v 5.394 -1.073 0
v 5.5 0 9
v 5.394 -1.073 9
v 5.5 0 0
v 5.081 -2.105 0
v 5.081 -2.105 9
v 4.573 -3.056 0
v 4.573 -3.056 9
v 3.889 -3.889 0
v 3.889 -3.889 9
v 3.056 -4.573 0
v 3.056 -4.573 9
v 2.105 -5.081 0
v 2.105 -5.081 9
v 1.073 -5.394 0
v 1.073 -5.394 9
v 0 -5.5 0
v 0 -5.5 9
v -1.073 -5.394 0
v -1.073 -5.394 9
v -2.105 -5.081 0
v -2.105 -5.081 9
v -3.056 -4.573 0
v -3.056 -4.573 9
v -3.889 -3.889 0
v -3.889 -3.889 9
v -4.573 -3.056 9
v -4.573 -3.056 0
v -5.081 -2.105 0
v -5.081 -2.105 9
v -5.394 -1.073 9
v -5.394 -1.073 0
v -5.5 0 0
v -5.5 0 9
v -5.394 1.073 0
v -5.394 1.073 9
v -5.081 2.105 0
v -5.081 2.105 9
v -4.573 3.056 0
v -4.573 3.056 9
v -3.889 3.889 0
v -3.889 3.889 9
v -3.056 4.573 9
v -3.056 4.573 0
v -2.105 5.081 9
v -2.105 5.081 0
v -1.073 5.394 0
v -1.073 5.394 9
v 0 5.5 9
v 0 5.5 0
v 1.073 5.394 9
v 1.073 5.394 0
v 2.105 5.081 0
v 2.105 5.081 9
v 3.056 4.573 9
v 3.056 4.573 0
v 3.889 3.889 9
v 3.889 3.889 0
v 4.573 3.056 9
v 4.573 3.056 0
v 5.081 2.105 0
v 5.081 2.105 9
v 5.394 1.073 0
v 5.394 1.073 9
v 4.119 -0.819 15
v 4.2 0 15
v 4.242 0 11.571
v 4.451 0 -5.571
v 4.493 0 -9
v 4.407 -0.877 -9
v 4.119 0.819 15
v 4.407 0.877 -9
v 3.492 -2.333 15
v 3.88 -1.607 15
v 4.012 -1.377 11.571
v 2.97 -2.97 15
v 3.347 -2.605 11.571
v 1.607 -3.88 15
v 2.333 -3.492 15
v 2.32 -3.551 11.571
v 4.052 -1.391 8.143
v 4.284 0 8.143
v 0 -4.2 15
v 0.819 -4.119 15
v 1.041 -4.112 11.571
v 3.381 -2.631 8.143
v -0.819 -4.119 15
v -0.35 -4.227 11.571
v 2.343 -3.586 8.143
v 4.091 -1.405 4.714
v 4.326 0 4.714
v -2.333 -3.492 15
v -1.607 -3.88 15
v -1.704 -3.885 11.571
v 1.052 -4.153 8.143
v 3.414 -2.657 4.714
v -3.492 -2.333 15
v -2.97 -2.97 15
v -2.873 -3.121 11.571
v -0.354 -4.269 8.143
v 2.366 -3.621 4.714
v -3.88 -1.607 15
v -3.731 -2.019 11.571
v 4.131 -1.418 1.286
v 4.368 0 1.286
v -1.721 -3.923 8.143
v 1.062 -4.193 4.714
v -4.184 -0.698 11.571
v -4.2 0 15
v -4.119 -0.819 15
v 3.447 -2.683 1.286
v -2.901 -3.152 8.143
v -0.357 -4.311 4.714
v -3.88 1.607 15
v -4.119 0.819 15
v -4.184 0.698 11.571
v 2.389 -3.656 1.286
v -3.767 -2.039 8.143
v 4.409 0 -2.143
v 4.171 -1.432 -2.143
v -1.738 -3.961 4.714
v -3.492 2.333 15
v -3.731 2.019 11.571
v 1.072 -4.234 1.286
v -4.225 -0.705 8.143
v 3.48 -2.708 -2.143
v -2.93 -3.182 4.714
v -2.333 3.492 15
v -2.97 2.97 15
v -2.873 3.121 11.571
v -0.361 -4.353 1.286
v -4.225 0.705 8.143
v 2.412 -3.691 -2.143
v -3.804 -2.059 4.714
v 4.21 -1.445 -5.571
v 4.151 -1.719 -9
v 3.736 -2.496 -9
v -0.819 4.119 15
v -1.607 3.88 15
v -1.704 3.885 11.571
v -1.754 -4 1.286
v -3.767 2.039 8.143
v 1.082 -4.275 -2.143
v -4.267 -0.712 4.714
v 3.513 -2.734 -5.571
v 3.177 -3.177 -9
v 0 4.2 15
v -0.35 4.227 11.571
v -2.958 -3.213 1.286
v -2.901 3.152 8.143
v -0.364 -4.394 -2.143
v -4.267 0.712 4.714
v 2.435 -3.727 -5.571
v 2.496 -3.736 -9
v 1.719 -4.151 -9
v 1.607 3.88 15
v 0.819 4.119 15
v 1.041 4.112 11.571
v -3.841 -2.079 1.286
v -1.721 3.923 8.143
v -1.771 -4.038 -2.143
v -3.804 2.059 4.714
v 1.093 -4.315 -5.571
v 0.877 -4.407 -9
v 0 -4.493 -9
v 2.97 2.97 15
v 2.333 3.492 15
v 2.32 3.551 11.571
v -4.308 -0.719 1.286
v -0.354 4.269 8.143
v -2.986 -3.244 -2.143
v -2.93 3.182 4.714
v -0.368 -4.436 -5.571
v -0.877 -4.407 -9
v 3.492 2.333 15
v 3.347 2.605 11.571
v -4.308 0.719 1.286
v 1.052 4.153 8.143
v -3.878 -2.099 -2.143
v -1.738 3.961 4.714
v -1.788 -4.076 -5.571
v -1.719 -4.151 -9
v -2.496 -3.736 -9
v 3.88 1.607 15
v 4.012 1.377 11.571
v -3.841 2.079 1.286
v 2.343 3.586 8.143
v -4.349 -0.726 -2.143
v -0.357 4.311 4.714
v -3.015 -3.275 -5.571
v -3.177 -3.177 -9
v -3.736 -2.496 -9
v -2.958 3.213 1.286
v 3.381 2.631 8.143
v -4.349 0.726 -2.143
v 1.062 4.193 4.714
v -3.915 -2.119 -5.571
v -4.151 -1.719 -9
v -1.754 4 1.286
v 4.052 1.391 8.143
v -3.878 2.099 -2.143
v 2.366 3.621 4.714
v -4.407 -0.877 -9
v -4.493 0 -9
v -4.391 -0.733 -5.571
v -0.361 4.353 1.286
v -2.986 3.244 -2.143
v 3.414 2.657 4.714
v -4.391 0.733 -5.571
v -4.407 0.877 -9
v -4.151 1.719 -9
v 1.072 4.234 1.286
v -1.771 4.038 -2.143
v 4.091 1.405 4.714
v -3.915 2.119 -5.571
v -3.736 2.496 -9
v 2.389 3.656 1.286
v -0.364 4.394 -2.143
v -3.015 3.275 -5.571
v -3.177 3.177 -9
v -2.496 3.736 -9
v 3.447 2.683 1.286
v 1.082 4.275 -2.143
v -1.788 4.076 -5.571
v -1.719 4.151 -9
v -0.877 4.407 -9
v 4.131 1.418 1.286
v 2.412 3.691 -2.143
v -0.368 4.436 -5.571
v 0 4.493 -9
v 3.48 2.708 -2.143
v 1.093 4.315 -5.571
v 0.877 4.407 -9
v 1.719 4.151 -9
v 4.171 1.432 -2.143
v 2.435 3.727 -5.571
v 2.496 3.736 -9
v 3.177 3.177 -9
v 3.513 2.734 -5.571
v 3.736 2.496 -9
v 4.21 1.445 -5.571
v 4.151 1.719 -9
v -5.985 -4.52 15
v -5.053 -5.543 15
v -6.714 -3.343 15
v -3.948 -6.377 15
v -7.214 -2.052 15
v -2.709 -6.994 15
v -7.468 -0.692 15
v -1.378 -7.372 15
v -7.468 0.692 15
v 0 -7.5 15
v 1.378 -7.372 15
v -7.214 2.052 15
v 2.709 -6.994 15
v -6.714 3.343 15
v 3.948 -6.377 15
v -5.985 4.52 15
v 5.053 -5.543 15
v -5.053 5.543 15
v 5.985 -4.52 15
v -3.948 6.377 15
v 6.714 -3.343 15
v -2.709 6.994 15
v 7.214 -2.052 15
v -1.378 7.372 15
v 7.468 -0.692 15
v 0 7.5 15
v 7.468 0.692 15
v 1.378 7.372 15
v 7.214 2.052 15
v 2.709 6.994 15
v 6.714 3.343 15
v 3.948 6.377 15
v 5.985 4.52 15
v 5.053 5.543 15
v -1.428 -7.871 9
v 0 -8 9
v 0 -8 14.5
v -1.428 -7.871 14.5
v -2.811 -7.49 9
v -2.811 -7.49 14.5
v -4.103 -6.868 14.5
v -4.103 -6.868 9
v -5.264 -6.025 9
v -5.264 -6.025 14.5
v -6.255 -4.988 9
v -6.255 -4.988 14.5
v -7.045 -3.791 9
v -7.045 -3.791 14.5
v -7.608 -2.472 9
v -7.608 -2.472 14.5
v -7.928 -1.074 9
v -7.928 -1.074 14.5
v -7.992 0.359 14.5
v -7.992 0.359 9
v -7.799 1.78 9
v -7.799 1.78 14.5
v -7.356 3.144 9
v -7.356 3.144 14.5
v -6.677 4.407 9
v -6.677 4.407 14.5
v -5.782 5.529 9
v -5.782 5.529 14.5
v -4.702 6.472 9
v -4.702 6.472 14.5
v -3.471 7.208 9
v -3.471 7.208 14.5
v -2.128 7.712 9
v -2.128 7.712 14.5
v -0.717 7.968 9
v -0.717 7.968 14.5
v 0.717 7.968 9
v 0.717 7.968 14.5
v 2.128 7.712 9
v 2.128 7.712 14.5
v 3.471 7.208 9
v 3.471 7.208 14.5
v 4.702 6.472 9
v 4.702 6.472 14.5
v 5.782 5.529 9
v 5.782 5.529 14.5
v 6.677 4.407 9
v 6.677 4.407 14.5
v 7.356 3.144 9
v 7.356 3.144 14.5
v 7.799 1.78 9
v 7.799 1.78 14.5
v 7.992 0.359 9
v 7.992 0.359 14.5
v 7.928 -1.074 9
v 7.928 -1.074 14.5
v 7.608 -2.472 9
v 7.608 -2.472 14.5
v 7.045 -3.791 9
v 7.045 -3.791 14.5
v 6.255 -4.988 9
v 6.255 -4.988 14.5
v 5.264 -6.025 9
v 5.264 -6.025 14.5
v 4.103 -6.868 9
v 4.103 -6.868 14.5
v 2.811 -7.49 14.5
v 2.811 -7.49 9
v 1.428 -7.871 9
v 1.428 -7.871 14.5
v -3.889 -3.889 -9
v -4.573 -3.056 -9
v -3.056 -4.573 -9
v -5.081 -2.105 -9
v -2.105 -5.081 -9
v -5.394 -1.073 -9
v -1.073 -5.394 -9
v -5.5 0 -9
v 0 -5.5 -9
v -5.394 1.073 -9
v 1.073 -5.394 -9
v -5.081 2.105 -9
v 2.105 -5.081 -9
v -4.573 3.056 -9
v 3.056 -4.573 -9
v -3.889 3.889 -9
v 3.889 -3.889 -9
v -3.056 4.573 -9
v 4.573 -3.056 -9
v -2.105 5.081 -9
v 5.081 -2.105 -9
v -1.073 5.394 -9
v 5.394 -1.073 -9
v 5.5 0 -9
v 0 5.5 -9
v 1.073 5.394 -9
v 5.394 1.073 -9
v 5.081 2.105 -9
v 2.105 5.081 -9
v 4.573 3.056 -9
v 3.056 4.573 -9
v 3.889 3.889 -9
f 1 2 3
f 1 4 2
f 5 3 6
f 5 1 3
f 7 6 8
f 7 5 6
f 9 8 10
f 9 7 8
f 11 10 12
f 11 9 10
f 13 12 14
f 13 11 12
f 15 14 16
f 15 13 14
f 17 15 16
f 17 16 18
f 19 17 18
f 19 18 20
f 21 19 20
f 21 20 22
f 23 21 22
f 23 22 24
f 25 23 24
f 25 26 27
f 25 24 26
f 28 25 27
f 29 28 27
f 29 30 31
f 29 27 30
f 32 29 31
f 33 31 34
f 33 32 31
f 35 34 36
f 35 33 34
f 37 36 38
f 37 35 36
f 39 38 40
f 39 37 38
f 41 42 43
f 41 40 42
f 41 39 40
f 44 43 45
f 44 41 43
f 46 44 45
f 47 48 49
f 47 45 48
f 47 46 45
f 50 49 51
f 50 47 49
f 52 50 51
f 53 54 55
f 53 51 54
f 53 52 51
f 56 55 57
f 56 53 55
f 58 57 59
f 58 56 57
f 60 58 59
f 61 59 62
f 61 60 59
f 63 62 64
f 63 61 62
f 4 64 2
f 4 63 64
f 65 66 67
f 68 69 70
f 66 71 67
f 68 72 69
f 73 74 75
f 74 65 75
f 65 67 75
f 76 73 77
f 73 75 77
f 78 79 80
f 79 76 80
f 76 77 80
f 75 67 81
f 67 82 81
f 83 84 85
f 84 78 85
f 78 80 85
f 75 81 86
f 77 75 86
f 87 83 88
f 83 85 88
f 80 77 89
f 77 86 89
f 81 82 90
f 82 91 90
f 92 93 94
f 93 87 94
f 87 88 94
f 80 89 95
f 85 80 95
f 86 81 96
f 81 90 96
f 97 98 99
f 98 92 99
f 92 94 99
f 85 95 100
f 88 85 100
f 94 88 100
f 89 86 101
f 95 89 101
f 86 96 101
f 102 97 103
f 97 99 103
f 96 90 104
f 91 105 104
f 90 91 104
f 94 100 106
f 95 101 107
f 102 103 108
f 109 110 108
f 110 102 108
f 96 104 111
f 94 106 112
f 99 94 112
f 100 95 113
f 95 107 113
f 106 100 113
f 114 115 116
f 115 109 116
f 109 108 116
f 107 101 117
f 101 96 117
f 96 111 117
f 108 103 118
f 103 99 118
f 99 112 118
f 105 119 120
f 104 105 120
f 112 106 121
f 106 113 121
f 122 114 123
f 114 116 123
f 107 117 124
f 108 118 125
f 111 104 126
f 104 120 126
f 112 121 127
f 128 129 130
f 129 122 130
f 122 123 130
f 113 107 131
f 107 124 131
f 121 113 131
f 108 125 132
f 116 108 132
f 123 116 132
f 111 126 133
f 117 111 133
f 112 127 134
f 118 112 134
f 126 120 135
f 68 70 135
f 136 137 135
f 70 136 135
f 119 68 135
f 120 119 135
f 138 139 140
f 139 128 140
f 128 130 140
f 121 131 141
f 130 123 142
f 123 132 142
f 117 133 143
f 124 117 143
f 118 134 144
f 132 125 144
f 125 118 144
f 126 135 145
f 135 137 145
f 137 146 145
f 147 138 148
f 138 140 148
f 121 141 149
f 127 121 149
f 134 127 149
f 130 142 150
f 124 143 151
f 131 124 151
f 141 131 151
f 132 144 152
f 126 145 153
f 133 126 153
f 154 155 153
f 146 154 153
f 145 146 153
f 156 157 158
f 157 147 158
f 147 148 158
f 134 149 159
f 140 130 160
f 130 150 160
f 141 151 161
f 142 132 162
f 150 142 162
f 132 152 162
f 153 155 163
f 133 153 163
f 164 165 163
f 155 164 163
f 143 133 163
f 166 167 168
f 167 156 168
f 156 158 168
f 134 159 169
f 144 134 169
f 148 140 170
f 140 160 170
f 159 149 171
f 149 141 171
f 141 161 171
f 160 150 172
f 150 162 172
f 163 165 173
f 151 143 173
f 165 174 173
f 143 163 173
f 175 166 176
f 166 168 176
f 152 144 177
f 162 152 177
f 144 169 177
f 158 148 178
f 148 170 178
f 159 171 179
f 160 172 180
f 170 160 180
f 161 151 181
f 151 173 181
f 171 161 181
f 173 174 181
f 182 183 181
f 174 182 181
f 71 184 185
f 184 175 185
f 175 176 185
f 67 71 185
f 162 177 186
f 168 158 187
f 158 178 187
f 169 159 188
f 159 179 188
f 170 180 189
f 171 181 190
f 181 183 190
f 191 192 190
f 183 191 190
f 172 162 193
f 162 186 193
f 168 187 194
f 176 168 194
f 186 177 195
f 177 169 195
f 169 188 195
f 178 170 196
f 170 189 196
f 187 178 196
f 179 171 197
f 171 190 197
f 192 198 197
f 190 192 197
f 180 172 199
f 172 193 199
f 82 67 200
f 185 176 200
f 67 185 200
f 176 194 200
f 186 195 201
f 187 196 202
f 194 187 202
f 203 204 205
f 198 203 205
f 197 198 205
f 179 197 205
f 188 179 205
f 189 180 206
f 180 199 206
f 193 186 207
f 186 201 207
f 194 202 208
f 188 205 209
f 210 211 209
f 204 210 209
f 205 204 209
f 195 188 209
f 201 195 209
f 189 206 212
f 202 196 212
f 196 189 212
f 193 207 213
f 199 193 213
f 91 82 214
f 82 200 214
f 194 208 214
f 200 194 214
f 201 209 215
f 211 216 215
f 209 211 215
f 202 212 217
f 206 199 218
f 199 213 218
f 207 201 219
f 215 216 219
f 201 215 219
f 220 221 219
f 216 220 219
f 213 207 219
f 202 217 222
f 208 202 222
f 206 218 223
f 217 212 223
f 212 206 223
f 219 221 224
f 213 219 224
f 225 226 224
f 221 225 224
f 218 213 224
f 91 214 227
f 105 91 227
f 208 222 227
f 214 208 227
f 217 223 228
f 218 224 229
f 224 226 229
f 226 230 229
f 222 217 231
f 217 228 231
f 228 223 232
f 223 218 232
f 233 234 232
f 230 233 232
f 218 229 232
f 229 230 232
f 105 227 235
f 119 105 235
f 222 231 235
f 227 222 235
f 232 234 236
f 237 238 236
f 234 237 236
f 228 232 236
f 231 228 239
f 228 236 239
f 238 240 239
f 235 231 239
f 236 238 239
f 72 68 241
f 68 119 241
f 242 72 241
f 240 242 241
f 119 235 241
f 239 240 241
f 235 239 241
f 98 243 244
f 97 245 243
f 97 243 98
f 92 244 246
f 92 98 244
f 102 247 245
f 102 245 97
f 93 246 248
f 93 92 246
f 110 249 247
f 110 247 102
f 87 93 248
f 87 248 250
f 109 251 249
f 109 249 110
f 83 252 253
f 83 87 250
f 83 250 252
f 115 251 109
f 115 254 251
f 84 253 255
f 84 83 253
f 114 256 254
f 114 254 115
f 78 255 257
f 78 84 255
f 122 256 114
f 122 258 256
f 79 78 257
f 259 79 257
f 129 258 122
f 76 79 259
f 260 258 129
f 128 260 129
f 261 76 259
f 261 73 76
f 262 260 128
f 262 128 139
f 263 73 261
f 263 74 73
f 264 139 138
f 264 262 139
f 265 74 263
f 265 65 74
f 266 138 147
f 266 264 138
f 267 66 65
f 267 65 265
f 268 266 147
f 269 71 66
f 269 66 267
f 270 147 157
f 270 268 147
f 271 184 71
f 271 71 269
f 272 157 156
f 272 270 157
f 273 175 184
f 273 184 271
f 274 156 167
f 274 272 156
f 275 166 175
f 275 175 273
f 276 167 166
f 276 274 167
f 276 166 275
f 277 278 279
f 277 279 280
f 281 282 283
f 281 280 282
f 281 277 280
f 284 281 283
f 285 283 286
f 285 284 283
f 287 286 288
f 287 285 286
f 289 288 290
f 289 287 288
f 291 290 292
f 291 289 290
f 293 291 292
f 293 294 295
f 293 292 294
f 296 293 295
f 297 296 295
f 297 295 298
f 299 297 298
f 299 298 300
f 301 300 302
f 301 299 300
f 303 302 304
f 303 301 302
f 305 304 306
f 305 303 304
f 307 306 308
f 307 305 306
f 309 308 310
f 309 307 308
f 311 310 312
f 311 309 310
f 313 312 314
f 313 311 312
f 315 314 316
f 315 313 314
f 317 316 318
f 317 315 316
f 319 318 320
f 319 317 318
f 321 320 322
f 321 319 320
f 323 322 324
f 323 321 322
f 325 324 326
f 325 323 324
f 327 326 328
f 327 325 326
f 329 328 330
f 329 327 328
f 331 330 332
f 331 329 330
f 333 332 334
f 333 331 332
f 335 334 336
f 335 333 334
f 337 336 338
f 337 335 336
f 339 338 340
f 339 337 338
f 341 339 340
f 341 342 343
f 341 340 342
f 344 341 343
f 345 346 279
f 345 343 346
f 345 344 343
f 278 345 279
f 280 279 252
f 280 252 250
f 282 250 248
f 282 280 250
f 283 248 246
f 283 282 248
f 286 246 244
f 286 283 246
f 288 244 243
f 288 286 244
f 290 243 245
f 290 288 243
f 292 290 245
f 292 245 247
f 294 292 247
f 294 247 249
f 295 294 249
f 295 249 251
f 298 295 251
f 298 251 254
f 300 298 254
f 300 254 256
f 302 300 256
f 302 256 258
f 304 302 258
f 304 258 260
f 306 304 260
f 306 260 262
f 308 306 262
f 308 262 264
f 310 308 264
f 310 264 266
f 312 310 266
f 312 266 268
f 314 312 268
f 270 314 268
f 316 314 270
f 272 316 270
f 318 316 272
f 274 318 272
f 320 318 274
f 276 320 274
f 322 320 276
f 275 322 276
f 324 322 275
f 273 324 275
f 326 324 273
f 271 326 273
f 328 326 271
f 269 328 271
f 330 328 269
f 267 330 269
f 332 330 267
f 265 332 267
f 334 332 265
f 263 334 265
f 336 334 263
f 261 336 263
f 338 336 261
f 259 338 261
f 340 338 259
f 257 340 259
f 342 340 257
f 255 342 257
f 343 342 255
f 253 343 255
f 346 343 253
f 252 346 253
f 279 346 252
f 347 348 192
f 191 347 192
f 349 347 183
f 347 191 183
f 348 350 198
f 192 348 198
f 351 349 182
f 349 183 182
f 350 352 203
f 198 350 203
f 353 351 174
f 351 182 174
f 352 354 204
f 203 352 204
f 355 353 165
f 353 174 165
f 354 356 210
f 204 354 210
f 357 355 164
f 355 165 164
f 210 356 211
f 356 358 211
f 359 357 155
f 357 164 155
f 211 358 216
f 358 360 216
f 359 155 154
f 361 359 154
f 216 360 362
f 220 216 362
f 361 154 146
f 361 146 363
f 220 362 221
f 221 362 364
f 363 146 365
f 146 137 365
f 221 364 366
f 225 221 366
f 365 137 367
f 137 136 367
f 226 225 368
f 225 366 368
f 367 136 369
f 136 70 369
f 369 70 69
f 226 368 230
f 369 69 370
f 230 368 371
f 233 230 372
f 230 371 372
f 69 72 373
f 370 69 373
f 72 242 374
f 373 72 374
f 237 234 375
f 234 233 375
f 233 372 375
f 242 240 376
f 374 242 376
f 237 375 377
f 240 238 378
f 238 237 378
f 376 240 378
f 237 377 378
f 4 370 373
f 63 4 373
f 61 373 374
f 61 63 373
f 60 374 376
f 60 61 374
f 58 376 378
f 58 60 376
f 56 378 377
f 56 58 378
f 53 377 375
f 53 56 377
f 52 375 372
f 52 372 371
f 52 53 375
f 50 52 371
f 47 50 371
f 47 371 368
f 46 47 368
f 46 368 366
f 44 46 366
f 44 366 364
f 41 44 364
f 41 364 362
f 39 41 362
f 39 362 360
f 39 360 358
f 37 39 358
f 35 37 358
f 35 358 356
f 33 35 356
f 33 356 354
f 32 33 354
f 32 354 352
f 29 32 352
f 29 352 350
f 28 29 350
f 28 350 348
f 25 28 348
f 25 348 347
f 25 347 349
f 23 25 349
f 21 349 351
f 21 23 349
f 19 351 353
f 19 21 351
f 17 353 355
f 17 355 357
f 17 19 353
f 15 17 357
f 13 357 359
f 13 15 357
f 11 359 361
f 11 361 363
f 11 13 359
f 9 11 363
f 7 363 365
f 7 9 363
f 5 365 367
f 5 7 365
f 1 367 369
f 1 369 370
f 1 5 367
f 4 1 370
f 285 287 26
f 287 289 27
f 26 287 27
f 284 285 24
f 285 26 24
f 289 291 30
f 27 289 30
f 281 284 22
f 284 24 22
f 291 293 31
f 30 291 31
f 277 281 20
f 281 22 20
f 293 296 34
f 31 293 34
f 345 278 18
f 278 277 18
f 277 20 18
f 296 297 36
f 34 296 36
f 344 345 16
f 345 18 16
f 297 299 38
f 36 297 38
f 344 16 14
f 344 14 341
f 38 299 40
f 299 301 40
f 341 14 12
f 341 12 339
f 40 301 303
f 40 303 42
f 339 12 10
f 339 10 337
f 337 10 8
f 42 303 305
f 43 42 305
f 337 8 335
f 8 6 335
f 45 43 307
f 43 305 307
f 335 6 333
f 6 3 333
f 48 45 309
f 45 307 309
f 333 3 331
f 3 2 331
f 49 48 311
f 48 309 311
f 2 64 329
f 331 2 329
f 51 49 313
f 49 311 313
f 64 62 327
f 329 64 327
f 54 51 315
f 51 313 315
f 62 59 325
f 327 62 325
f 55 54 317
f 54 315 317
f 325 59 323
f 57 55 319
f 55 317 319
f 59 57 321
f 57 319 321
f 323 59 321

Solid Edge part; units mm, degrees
sketch "Sketch1" plane through (0, 0, 0) normal (0, 0, 1) x (1, 0, 0)
  circle A0 centre (0, 0) radius 5.5
extrude "Ajout_matière_1" add sketch "Sketch1" along normal mid plane 18
sketch "Sketch2" plane through (0, 0, 9) normal (0, 0, 1) x (0, -1, 0)
  circle A0 centre (0, 0) radius 8
extrude "Ajout_matière_3" add sketch "Sketch2" along normal blind 6
sketch "Sketch3" plane through (0, 0, 15) normal (0, 0, 1) x (1, 0, 0)
  circle A0 centre (0, 0) radius 4.2
  dimension "D1" = 8.4
extrude "Cutout1" cut sketch "Sketch3" against normal up to next and the other way up to next
draft "Dépouille_4" angle 0.7 neutral plane through (0, 0, 15) normal (0, 0, 1) pull direction (0, 0, -1) face at (2.3242, 3.4983, -4.76)
chamfer "Chanfrein_2" distance 0.5 angle 45 1 edges at (0, 8, 15)
properties material "Plastique ABS, haute performance"
